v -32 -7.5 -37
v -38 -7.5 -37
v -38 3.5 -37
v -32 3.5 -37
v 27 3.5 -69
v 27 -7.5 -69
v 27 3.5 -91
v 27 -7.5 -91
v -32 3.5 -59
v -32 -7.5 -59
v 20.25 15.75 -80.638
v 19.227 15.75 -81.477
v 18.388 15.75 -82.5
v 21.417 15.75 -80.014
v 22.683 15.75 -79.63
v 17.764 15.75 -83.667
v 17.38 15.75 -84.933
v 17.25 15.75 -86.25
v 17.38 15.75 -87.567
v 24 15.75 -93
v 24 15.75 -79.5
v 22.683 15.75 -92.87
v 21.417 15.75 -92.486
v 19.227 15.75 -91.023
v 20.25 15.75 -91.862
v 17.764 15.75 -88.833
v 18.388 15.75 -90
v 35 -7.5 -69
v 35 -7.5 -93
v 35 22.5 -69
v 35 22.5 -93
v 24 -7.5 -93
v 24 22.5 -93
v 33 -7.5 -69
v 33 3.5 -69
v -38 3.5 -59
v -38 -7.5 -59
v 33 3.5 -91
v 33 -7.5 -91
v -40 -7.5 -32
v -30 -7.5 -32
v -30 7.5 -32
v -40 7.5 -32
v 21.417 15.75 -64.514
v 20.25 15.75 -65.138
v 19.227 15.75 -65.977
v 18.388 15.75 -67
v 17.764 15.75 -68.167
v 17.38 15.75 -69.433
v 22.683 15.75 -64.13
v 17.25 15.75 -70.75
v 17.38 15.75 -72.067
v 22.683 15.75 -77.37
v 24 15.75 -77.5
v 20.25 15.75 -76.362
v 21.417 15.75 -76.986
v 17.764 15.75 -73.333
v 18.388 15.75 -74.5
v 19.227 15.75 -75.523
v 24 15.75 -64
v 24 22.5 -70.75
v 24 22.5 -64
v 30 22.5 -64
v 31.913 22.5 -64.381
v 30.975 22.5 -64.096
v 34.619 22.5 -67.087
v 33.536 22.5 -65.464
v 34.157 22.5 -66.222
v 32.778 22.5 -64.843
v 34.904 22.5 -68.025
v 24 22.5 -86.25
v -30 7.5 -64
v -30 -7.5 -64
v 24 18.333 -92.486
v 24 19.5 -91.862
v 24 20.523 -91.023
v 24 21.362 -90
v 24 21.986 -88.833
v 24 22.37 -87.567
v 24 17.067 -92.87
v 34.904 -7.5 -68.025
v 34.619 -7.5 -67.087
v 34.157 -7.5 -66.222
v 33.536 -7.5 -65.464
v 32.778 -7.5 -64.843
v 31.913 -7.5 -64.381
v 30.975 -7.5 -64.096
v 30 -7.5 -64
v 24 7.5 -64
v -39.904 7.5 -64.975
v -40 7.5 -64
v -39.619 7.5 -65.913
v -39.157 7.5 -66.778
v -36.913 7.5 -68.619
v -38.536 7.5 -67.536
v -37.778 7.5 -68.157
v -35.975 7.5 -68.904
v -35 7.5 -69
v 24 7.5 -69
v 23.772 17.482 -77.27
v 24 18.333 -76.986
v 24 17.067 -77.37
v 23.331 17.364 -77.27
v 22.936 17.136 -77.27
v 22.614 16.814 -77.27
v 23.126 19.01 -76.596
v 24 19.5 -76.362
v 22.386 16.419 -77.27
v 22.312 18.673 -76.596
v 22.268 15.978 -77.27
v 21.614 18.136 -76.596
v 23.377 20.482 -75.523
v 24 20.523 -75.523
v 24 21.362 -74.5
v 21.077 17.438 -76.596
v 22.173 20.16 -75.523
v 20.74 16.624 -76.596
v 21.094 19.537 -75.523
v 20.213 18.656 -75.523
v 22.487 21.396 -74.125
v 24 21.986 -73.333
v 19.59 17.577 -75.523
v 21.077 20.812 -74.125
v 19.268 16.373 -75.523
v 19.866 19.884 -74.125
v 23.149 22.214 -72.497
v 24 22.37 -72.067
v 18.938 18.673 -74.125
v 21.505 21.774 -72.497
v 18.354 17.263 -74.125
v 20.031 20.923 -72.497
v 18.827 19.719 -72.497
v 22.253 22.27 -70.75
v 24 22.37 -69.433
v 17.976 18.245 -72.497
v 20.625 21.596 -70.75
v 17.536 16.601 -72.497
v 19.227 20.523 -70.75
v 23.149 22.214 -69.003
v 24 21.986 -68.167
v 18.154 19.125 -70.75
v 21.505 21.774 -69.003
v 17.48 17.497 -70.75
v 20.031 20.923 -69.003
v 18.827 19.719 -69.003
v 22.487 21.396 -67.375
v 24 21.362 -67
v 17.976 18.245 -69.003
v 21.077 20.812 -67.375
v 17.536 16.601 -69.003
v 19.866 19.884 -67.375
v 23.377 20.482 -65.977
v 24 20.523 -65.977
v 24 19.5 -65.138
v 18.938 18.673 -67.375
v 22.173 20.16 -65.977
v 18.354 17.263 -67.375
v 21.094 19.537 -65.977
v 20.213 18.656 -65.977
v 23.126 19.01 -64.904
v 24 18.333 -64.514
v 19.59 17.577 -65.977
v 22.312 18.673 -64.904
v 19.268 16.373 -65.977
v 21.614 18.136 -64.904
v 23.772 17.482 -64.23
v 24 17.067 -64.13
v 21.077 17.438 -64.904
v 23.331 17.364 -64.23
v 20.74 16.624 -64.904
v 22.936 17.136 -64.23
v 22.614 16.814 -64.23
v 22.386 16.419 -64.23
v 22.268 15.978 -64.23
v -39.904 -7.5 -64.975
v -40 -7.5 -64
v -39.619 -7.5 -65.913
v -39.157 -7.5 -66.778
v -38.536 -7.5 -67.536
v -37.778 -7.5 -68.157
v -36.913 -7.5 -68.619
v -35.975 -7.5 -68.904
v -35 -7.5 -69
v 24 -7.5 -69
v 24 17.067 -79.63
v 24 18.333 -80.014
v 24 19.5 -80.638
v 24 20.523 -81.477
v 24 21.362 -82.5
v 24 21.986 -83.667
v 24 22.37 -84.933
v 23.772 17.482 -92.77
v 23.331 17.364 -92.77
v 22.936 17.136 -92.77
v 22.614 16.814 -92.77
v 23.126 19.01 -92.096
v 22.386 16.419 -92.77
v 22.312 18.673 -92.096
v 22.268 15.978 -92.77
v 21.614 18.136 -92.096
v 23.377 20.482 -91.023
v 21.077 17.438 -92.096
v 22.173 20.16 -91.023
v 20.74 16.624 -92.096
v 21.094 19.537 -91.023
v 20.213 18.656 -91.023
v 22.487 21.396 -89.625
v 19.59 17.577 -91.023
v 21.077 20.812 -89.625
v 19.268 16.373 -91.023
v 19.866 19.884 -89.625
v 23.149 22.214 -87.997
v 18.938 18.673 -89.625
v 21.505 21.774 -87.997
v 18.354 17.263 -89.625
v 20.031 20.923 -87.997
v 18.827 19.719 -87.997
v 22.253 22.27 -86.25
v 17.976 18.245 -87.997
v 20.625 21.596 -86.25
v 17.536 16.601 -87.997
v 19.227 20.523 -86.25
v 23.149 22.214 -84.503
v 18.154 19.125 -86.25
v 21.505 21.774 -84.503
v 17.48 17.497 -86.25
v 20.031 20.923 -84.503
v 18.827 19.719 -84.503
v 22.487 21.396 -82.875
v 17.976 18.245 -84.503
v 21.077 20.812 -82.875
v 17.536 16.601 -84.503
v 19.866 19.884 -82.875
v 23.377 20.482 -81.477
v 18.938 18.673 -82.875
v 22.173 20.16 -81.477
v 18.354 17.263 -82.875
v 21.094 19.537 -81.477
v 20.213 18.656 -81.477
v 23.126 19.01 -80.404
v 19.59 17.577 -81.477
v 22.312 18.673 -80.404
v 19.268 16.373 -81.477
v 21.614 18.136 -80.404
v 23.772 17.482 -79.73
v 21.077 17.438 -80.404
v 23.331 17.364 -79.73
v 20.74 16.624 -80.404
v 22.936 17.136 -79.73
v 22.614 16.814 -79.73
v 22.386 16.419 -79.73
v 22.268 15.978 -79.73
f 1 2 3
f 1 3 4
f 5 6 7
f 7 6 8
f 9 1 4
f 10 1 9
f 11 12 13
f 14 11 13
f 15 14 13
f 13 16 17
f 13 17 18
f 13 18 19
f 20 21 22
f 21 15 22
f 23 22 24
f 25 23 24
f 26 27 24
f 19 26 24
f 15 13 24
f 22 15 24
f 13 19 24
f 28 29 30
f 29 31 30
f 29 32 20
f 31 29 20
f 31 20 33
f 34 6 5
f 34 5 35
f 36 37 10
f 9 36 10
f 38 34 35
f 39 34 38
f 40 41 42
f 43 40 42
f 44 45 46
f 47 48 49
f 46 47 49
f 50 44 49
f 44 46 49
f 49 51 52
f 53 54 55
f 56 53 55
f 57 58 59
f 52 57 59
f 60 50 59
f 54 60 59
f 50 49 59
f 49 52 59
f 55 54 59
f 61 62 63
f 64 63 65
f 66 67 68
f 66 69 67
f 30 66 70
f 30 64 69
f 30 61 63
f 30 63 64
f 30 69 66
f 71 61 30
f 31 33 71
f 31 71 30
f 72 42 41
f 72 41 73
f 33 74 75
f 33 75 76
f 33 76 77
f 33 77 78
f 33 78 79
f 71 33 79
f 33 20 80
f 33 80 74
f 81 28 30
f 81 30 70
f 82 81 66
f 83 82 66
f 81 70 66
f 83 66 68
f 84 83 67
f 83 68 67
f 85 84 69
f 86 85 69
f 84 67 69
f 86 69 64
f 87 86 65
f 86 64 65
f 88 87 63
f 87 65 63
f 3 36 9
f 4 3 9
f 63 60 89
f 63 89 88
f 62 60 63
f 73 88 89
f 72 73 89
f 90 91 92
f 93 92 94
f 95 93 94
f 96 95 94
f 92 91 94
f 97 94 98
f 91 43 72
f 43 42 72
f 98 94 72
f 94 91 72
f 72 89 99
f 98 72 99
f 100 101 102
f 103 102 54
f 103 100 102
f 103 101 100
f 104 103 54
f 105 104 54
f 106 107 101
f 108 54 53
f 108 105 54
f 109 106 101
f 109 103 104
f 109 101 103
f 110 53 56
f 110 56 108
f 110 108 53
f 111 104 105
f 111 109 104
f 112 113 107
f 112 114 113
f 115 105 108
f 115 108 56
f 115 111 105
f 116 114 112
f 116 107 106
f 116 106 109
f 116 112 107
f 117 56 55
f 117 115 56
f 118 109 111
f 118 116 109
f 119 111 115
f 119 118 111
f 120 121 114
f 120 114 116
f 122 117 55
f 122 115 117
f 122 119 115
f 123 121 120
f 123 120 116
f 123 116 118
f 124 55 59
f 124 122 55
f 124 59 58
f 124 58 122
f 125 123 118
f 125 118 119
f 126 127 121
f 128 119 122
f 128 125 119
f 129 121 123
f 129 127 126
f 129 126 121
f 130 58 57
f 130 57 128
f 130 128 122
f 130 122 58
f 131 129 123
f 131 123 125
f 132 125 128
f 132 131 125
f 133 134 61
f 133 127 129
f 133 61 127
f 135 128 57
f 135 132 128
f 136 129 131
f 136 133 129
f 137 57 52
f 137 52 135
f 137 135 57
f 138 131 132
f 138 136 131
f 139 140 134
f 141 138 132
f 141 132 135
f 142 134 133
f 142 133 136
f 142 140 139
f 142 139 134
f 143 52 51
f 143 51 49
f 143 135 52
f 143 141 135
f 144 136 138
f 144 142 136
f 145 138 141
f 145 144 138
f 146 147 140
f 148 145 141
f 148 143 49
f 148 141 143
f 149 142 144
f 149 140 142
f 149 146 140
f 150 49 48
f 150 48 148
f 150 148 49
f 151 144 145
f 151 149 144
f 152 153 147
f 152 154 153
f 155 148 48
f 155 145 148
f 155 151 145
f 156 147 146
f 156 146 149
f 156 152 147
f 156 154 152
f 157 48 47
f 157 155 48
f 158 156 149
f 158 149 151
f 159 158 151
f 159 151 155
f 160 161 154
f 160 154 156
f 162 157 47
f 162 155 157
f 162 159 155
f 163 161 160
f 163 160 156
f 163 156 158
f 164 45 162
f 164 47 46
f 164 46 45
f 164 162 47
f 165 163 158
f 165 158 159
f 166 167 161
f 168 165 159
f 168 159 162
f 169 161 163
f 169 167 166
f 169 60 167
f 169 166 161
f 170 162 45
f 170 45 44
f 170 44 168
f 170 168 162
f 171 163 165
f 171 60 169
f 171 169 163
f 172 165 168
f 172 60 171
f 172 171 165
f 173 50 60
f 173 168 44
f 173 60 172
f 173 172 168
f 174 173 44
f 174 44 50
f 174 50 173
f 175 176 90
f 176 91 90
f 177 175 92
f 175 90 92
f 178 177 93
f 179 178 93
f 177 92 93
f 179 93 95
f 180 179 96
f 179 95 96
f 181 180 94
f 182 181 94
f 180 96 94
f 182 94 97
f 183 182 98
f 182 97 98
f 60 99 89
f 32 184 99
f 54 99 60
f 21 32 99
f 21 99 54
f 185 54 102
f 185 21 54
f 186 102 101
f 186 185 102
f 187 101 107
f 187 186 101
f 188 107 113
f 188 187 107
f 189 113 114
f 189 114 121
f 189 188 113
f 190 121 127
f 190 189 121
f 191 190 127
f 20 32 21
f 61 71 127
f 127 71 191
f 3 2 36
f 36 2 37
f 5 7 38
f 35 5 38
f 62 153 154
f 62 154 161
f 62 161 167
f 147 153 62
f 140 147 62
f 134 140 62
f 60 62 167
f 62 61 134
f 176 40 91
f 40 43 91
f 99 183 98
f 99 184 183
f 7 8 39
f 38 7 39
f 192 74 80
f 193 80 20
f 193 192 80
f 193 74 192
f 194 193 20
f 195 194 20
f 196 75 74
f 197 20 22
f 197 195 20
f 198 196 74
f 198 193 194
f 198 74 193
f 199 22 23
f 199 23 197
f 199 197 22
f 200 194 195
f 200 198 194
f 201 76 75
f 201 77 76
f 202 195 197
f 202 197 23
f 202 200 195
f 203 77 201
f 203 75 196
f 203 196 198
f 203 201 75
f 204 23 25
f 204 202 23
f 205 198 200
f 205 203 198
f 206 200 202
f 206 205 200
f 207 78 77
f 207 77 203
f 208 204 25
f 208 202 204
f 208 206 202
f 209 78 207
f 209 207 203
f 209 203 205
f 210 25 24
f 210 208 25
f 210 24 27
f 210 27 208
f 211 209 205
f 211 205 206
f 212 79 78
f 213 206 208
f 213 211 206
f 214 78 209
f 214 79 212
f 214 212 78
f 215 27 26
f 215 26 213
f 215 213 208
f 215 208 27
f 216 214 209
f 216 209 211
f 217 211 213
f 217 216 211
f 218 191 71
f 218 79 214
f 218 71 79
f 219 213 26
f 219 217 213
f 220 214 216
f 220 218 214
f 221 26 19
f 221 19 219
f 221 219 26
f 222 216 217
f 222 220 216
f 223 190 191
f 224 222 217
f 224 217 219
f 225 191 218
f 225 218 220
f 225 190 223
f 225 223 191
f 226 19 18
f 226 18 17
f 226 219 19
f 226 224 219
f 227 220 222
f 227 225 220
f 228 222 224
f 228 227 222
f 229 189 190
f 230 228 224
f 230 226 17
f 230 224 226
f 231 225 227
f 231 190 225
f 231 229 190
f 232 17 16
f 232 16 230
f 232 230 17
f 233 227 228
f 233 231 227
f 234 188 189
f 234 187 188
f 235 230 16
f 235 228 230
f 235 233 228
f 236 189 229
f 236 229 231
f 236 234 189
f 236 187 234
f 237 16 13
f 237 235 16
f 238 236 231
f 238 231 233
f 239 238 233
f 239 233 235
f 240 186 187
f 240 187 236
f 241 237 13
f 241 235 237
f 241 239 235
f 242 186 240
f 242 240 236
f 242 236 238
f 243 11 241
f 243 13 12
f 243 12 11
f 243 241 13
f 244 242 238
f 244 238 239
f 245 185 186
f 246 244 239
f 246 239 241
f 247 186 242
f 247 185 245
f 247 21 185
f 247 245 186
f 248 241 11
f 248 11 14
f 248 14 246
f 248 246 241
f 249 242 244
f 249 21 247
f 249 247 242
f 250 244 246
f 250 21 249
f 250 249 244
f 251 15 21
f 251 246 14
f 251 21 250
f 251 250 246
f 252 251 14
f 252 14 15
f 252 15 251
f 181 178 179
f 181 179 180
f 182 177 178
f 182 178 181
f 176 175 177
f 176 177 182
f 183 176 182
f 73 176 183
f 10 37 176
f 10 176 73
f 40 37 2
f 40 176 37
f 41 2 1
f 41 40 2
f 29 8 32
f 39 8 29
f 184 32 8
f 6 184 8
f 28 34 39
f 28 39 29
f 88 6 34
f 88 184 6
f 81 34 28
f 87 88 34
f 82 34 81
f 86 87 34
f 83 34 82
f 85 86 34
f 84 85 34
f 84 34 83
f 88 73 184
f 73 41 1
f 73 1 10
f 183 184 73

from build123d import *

# Parameters (mm, degrees)
SKETCH1_W                       = 60
SKETCH1_H                       = 15
BOSS_EXTRUDE1_DEPTH             = 5
SKETCH2_W                       = 37
SKETCH2_H                       = 15
BOSS_EXTRUDE2_DEPTH             = 10
FILLET1_R                       = 5
SKETCH3_W                       = 29
SKETCH3_H                       = 30
BOSS_EXTRUDE3_DEPTH             = 5
FILLET2_R                       = 5
BOSS_EXTRUDE6_REACH             = 26
SKETCH8_W                       = 6
SKETCH8_H                       = 30
BOSS_EXTRUDE6_DIRECTION_2_REACH = 39
SKETCH7_W                       = 6
SKETCH7_H                       = 22
CUT_EXTRUDE3_DEPTH              = 11
REVOLVE1_ANGLE                  = 90


with BuildPart() as part:
    # Sketch1 → Boss-Extrude1 (new body)
    with BuildSketch(Plane.XY):
        Rectangle(SKETCH1_W, SKETCH1_H)
    extrude(amount=BOSS_EXTRUDE1_DEPTH)

    # Sketch2 → Boss-Extrude2 (add)
    with BuildSketch(Plane.ZY.offset(30)):
        with Locations((-13.5, 0)):
            Rectangle(SKETCH2_W, SKETCH2_H)
    extrude(amount=BOSS_EXTRUDE2_DEPTH)

    # Fillet1
    fillet1_edges = [part.edges().sort_by_distance(p)[0] for p in [
        (-40, 0, 5),
    ]]
    fillet(fillet1_edges, radius=FILLET1_R)

    # Sketch3 → Boss-Extrude3 (add)
    with BuildSketch(Plane(origin=(30, 0, 0), x_dir=(0, 0, -1), z_dir=(1, 0, 0))):
        with Locations((-14.5, 7.5)):
            Rectangle(SKETCH3_W, SKETCH3_H)
    extrude(amount=BOSS_EXTRUDE3_DEPTH)

    # Fillet2
    fillet2_edges = [part.edges().sort_by_distance(p)[0] for p in [
        (35, 7.5, 0),
    ]]
    fillet(fillet2_edges, radius=FILLET2_R)

    # Boss-Extrude6: up to this face of the body (flat: up to its plane)
    boss_extrude6_end = Plane(part.part.faces().sort_by_distance((32.5, 7.5, 29))[0])
    # Sketch8 → Boss-Extrude6 (add, up to the picked face)
    with BuildSketch(Plane.XY.offset(5), mode=Mode.PRIVATE) as boss_extrude6_sk1:
        with Locations((27, 7.5)):
            Rectangle(SKETCH8_W, SKETCH8_H)
    boss_extrude6_tool1 = split(extrude(boss_extrude6_sk1.sketch, amount=BOSS_EXTRUDE6_REACH, mode=Mode.PRIVATE), bisect_by=boss_extrude6_end, keep=Keep.BOTH, mode=Mode.PRIVATE)
    add(boss_extrude6_tool1.solids().sort_by(Axis((27, 7.5, 5), (0, 0, 1)))[0])

    # Boss-Extrude6 direction 2: up to this face of the body (flat: up to its plane)
    boss_extrude6_direction_2_end = Plane(part.part.faces().sort_by_distance((0, 0, 0))[0])
    # Sketch8 → Boss-Extrude6 direction 2 (add, up to the picked face)
    with BuildSketch(Plane.XY.offset(5), mode=Mode.PRIVATE) as boss_extrude6_direction_2_sk1:
        with Locations((27, 7.5)):
            Rectangle(SKETCH8_W, SKETCH8_H)
    boss_extrude6_direction_2_tool1 = split(extrude(boss_extrude6_direction_2_sk1.sketch, amount=-BOSS_EXTRUDE6_DIRECTION_2_REACH, mode=Mode.PRIVATE), bisect_by=boss_extrude6_direction_2_end, keep=Keep.BOTH, mode=Mode.PRIVATE)
    add(boss_extrude6_direction_2_tool1.solids().sort_by(Axis((27, 7.5, 5), (0, 0, -1)))[0])

    # Sketch7 → Cut-Extrude3 (cut)
    with BuildSketch(Plane.XZ.offset(7.5)):
        with Locations((30, 16)):
            Rectangle(SKETCH7_W, SKETCH7_H)
        with Locations((-35, -16)):
            Rectangle(SKETCH7_W, SKETCH7_H)
    extrude(amount=-CUT_EXTRUDE3_DEPTH, mode=Mode.SUBTRACT)

    # Sketch9 → Revolve1 (revolve)
    with BuildSketch(Plane.ZY.offset(-24)):
        with BuildLine():
            Line((15.5, 15.75), (29, 15.75))
            ThreePointArc((29, 15.75), (22.25, 22.5), (15.5, 15.75))
        make_face()
        with BuildLine():
            ThreePointArc((13.5, 15.75), (6.75, 22.5), (0, 15.75))
            Line((0, 15.75), (13.5, 15.75))
        make_face()
    revolve(axis=Axis((24, 15.75, 0), (0, 0, 1)), revolution_arc=REVOLVE1_ANGLE)


with BuildPart() as body_2:
    # Mirror1: mirrored copy
    add(part.part.mirror(Plane(origin=(-40, 7.5, -32), x_dir=(1, 0, 0), z_dir=(0, 0, 1))))


solid = body_2.part
